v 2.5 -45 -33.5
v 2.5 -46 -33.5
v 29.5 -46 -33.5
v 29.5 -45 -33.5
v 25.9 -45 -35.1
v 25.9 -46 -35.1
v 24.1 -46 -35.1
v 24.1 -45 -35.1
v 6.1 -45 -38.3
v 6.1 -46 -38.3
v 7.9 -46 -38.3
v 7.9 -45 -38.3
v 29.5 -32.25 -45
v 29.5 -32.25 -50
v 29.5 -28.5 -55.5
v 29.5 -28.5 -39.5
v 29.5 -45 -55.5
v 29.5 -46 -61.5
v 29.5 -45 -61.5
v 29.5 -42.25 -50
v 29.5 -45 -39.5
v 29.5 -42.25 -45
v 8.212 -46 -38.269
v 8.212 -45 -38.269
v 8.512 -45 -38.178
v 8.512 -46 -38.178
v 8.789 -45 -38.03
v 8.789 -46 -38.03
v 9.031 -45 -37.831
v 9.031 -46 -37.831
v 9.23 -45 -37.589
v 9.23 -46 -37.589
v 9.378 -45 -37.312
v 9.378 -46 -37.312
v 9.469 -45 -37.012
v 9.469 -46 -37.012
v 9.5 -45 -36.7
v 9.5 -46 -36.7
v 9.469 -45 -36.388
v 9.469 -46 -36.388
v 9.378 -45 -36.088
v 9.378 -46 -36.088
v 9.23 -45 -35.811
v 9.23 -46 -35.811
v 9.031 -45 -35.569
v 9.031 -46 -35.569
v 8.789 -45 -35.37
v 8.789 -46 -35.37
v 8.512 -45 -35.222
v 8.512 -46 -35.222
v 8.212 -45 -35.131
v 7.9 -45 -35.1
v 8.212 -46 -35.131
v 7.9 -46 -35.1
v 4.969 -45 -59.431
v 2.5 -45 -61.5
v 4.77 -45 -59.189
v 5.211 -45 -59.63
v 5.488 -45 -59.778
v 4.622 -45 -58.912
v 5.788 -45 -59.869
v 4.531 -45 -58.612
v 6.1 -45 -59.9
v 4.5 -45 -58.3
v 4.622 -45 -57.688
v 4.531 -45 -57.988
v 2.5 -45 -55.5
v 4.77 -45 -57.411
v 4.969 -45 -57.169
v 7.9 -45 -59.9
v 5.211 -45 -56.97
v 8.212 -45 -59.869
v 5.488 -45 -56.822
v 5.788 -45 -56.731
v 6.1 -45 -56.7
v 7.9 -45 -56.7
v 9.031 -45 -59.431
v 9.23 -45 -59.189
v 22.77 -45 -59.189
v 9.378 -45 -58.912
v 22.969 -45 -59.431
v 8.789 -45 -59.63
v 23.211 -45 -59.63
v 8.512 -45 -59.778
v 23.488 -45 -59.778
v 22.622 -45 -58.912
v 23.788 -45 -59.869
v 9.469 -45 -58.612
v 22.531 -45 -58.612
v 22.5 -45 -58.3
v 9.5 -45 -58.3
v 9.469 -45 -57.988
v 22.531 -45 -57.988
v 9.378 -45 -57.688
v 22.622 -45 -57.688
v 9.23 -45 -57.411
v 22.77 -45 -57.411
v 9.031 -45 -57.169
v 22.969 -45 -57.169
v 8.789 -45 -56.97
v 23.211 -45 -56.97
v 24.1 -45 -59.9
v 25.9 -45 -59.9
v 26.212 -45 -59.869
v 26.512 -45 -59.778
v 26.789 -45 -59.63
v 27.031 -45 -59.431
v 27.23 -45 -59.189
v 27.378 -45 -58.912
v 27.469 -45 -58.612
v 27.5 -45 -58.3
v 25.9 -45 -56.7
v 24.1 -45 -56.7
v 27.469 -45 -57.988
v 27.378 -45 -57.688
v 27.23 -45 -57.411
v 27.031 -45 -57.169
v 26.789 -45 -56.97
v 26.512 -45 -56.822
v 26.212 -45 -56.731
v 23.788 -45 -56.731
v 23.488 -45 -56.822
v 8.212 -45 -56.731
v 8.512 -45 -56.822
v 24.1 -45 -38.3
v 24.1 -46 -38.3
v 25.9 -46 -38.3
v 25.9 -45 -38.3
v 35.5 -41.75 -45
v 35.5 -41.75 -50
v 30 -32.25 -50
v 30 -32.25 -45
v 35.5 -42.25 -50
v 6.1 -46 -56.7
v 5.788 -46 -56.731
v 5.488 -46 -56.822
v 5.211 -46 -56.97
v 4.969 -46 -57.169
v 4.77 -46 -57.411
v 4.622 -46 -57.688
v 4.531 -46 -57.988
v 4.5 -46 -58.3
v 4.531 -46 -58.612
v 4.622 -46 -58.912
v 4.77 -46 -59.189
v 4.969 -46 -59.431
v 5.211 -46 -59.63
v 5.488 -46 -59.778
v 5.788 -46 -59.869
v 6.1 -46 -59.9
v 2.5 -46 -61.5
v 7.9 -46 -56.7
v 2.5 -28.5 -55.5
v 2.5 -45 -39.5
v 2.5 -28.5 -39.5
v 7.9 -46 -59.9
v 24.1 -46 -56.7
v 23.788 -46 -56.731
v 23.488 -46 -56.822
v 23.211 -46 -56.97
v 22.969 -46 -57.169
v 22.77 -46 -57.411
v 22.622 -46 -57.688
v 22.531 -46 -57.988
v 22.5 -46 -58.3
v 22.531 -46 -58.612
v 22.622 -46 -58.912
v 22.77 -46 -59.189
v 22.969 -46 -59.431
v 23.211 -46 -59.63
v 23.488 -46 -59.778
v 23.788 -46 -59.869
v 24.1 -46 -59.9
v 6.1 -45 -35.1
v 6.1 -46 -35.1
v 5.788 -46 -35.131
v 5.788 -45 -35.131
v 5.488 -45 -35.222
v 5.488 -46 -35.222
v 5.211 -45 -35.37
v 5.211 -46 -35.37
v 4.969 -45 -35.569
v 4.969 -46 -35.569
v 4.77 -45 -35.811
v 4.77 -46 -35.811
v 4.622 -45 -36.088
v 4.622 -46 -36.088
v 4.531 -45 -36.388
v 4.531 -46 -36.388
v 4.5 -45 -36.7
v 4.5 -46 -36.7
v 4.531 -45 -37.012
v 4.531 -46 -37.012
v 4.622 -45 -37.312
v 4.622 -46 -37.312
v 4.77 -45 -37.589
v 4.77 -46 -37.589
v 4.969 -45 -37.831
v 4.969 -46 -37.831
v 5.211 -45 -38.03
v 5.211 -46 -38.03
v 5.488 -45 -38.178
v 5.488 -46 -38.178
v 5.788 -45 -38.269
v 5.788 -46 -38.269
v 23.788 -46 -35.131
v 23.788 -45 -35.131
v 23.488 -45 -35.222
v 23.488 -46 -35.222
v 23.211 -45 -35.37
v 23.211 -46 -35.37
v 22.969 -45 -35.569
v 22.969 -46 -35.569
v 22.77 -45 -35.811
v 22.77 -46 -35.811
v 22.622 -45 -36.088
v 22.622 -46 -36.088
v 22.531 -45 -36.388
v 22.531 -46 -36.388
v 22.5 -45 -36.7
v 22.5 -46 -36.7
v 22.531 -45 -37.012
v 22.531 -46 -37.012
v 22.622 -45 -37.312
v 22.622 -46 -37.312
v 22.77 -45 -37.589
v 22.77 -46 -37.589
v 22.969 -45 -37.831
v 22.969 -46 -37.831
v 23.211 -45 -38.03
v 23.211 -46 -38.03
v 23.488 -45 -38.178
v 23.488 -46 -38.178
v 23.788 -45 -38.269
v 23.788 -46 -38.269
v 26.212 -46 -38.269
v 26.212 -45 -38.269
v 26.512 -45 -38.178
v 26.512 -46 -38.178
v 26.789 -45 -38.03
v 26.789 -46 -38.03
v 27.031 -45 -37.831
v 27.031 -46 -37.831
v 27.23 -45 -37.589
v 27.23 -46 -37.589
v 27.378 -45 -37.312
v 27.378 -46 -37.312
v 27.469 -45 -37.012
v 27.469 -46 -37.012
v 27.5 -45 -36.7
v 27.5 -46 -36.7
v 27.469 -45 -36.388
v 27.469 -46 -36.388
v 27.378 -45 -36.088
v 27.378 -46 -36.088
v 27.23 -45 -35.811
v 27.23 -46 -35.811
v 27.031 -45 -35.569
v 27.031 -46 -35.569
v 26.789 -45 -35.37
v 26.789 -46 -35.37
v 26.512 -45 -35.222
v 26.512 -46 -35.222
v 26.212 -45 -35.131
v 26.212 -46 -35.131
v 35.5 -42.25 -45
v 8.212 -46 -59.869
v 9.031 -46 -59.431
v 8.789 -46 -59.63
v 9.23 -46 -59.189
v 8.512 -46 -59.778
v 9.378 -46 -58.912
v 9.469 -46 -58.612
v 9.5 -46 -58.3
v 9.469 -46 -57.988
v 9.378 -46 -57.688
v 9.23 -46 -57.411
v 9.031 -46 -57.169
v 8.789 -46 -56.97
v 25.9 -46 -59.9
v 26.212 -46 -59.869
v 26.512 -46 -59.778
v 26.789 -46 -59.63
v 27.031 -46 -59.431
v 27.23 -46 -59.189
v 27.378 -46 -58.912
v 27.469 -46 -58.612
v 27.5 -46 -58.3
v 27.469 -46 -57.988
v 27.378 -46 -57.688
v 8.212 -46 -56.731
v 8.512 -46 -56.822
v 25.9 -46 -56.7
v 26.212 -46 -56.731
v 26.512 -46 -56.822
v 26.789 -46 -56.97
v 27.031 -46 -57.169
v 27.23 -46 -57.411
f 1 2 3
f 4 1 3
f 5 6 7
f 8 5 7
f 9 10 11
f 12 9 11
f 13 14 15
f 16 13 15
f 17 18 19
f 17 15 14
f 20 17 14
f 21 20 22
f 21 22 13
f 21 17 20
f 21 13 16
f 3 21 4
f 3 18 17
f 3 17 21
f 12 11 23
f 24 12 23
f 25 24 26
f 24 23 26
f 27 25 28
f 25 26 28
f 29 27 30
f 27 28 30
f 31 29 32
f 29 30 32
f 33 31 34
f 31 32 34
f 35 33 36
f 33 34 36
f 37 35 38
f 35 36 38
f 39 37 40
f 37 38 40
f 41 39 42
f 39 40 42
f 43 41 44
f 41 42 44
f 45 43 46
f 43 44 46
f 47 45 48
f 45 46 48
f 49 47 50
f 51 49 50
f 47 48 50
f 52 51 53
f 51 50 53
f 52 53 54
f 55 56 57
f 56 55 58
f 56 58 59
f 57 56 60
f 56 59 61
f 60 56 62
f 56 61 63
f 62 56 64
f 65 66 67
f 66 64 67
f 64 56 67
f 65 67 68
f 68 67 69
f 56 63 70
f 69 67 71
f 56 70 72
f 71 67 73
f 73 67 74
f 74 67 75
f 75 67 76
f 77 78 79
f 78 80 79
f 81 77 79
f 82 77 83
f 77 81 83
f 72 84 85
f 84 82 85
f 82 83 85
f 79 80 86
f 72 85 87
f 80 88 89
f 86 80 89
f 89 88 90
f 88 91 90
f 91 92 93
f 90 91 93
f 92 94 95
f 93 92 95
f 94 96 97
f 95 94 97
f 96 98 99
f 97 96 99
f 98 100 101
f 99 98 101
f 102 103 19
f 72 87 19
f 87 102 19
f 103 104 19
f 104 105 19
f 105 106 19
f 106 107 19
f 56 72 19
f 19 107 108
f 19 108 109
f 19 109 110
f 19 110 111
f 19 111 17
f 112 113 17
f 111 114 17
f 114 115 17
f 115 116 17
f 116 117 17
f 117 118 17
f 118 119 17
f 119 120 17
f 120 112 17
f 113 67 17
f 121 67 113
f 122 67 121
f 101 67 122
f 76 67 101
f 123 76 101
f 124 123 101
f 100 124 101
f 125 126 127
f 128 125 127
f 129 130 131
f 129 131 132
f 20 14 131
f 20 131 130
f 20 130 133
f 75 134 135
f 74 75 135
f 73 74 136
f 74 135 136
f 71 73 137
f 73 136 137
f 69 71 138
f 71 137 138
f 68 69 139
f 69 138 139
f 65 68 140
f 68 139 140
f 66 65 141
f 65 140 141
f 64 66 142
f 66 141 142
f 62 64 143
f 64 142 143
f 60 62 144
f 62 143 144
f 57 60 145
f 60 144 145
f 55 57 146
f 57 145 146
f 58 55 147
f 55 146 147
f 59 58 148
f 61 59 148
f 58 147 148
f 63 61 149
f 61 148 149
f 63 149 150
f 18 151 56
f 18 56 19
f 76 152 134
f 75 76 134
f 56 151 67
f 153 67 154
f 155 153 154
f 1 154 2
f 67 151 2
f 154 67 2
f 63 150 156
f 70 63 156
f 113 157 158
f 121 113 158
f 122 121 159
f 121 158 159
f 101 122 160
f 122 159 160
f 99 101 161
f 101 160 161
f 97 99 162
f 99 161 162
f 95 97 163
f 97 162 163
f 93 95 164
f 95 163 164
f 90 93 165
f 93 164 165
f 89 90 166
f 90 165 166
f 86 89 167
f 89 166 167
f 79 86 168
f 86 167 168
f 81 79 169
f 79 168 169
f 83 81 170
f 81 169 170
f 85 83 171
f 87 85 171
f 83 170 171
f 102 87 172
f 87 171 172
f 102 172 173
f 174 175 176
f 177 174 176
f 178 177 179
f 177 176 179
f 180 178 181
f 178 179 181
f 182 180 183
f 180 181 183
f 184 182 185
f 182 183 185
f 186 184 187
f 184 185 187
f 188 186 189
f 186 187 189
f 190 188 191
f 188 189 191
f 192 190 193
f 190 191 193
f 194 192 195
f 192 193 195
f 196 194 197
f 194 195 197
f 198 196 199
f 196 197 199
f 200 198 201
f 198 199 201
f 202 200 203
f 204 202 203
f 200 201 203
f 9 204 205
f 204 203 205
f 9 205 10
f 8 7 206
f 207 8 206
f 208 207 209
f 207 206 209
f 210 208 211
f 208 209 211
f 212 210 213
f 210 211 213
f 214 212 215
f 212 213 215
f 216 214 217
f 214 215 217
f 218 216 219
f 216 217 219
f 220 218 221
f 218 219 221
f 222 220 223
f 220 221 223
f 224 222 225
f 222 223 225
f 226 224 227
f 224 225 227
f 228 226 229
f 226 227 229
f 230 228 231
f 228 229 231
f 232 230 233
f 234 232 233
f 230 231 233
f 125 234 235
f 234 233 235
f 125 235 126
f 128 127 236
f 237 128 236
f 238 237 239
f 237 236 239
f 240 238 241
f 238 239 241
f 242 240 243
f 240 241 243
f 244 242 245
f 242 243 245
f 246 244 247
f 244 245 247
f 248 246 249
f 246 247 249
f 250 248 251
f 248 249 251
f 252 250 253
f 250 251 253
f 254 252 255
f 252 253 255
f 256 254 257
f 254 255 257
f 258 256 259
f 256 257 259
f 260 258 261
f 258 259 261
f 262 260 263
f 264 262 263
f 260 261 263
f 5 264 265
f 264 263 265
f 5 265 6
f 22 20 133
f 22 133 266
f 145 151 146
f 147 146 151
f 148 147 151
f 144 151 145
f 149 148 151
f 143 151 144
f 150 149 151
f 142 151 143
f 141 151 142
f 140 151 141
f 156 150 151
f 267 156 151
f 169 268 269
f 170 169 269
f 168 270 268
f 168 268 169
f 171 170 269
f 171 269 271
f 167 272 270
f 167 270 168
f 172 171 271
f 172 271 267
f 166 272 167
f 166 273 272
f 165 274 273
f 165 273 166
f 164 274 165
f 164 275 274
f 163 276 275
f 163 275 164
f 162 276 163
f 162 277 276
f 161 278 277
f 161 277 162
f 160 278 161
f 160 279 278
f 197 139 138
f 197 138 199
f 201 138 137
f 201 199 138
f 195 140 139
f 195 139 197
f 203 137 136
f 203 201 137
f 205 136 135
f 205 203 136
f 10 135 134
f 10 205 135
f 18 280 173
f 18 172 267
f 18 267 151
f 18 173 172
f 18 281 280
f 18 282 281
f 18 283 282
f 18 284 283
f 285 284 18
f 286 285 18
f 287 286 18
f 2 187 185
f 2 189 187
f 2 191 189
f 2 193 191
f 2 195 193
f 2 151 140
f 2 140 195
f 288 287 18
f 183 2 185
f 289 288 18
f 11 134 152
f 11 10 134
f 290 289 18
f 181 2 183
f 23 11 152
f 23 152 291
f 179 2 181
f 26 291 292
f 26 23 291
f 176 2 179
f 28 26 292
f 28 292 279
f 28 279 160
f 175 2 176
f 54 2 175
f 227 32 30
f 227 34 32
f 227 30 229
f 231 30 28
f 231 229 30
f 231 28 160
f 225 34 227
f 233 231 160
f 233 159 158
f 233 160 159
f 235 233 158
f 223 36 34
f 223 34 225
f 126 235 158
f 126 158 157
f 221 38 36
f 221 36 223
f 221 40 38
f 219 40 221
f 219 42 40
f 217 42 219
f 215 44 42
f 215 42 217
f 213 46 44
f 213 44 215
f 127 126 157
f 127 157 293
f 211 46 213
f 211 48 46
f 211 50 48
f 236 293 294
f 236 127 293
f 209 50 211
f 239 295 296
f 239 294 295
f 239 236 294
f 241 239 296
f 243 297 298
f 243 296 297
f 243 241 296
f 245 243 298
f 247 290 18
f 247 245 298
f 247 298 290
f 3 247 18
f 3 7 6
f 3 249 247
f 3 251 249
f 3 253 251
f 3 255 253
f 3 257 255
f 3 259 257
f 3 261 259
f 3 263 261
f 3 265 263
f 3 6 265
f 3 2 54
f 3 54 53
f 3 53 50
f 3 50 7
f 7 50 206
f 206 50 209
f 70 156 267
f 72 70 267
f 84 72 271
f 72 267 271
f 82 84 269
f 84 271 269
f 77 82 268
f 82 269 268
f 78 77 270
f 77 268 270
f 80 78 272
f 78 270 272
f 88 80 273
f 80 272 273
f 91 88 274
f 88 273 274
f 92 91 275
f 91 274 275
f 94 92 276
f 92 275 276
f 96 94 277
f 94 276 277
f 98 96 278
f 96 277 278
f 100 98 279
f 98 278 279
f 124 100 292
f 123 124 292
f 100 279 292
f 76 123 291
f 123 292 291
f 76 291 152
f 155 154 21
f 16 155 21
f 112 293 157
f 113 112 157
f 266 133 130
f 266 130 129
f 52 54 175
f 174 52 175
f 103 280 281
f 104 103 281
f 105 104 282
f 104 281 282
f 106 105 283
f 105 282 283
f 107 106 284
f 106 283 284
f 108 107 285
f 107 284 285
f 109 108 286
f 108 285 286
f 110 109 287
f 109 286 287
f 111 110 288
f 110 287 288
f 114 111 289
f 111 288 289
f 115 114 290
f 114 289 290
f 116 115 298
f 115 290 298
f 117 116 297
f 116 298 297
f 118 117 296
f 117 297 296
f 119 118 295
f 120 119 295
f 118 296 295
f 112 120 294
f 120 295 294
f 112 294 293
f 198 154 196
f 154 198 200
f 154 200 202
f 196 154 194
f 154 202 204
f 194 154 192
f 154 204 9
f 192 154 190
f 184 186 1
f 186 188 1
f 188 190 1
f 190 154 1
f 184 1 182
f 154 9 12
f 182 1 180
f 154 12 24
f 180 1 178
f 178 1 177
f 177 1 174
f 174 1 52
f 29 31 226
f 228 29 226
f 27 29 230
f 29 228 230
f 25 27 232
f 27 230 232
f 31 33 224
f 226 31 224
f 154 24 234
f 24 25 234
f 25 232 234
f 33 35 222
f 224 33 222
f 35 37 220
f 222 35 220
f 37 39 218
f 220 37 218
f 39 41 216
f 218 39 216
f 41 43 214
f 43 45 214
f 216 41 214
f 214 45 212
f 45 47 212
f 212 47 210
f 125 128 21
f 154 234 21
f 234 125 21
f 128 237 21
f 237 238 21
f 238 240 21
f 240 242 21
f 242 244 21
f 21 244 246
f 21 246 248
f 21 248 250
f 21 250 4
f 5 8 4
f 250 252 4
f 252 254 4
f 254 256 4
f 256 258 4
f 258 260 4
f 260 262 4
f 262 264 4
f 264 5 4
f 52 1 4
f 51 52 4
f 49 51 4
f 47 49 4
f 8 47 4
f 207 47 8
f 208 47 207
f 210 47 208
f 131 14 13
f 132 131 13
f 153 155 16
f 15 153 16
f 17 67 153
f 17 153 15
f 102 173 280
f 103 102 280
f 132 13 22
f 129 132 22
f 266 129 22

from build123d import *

# Parameters (mm, degrees)
SKETCH083_W   = 27
SKETCH083_H   = 16
PAD049_DEPTH  = 17.5
SKETCH084_W   = 5
SKETCH084_H   = 10
PAD050_DEPTH  = 6
CHAMFER_SIZE2 = 9.5
CHAMFER_SIZE  = 5.5
SKETCH085_W   = 27
SKETCH085_H   = 6
PAD051_DEPTH  = 1


with BuildPart() as part:
    # Sketch083 → Pad049 (new body)
    with BuildSketch(Plane.XZ):
        Rectangle(SKETCH083_W, SKETCH083_H)
    extrude(amount=-PAD049_DEPTH)

    # Sketch084 (on Face4 of Pad049) → Pad050 (join)
    with BuildSketch(Plane(origin=(13.5, 0, 0), x_dir=(0, 0, 1), z_dir=(1, 0, 0))):
        with Locations((0, -8.75)):
            Rectangle(SKETCH084_W, SKETCH084_H)
    extrude(amount=PAD050_DEPTH)

    # Chamfer
    chamfer_edges = [part.edges().sort_by_distance(p)[0] for p in [
        (19.5, 13.75, 0),
    ]]
    chamfer_side = part.faces().sort_by_distance((16.5, 13.75, 0))[0]
    chamfer(chamfer_edges, length=CHAMFER_SIZE, length2=CHAMFER_SIZE2, reference=chamfer_side)

    # Sketch085 (on Face9 of Chamfer) → Pad051 (join)
    with BuildSketch(Plane.XZ):
        with Locations((0, 11)):
            Rectangle(SKETCH085_W, SKETCH085_H)
        with BuildLine():
            Line((-9.9, 9.2), (-8.1, 9.2))
            ThreePointArc((-8.1, 9.2), (-6.5, 10.8), (-8.1, 12.4))
            Line((-8.1, 12.4), (-9.9, 12.4))
            ThreePointArc((-9.9, 12.4), (-11.5, 10.8), (-9.9, 9.2))
        make_face(mode=Mode.SUBTRACT)
        with BuildLine():
            Line((8.1, 9.2), (9.9, 9.2))
            ThreePointArc((9.9, 9.2), (11.5, 10.8), (9.9, 12.4))
            Line((9.9, 12.4), (8.1, 12.4))
            ThreePointArc((8.1, 12.4), (6.5, 10.8), (8.1, 9.2))
        make_face(mode=Mode.SUBTRACT)
        with Locations((0, -11)):
            Rectangle(SKETCH085_W, SKETCH085_H)
        with BuildLine():
            Line((-9.9, -12.4), (-8.1, -12.4))
            ThreePointArc((-8.1, -12.4), (-6.5, -10.8), (-8.1, -9.2))
            Line((-8.1, -9.2), (-9.9, -9.2))
            ThreePointArc((-9.9, -9.2), (-11.5, -10.8), (-9.9, -12.4))
        make_face(mode=Mode.SUBTRACT)
        with BuildLine():
            Line((8.1, -12.4), (9.9, -12.4))
            ThreePointArc((9.9, -12.4), (11.5, -10.8), (9.9, -9.2))
            Line((9.9, -9.2), (8.1, -9.2))
            ThreePointArc((8.1, -9.2), (6.5, -10.8), (8.1, -12.4))
        make_face(mode=Mode.SUBTRACT)
    extrude(amount=-PAD051_DEPTH)


with BuildPart() as part_1:
    # Body020 placement: moved
    add(part.part.moved(Location((16, -46, -47.5))))


solid = part_1.part
